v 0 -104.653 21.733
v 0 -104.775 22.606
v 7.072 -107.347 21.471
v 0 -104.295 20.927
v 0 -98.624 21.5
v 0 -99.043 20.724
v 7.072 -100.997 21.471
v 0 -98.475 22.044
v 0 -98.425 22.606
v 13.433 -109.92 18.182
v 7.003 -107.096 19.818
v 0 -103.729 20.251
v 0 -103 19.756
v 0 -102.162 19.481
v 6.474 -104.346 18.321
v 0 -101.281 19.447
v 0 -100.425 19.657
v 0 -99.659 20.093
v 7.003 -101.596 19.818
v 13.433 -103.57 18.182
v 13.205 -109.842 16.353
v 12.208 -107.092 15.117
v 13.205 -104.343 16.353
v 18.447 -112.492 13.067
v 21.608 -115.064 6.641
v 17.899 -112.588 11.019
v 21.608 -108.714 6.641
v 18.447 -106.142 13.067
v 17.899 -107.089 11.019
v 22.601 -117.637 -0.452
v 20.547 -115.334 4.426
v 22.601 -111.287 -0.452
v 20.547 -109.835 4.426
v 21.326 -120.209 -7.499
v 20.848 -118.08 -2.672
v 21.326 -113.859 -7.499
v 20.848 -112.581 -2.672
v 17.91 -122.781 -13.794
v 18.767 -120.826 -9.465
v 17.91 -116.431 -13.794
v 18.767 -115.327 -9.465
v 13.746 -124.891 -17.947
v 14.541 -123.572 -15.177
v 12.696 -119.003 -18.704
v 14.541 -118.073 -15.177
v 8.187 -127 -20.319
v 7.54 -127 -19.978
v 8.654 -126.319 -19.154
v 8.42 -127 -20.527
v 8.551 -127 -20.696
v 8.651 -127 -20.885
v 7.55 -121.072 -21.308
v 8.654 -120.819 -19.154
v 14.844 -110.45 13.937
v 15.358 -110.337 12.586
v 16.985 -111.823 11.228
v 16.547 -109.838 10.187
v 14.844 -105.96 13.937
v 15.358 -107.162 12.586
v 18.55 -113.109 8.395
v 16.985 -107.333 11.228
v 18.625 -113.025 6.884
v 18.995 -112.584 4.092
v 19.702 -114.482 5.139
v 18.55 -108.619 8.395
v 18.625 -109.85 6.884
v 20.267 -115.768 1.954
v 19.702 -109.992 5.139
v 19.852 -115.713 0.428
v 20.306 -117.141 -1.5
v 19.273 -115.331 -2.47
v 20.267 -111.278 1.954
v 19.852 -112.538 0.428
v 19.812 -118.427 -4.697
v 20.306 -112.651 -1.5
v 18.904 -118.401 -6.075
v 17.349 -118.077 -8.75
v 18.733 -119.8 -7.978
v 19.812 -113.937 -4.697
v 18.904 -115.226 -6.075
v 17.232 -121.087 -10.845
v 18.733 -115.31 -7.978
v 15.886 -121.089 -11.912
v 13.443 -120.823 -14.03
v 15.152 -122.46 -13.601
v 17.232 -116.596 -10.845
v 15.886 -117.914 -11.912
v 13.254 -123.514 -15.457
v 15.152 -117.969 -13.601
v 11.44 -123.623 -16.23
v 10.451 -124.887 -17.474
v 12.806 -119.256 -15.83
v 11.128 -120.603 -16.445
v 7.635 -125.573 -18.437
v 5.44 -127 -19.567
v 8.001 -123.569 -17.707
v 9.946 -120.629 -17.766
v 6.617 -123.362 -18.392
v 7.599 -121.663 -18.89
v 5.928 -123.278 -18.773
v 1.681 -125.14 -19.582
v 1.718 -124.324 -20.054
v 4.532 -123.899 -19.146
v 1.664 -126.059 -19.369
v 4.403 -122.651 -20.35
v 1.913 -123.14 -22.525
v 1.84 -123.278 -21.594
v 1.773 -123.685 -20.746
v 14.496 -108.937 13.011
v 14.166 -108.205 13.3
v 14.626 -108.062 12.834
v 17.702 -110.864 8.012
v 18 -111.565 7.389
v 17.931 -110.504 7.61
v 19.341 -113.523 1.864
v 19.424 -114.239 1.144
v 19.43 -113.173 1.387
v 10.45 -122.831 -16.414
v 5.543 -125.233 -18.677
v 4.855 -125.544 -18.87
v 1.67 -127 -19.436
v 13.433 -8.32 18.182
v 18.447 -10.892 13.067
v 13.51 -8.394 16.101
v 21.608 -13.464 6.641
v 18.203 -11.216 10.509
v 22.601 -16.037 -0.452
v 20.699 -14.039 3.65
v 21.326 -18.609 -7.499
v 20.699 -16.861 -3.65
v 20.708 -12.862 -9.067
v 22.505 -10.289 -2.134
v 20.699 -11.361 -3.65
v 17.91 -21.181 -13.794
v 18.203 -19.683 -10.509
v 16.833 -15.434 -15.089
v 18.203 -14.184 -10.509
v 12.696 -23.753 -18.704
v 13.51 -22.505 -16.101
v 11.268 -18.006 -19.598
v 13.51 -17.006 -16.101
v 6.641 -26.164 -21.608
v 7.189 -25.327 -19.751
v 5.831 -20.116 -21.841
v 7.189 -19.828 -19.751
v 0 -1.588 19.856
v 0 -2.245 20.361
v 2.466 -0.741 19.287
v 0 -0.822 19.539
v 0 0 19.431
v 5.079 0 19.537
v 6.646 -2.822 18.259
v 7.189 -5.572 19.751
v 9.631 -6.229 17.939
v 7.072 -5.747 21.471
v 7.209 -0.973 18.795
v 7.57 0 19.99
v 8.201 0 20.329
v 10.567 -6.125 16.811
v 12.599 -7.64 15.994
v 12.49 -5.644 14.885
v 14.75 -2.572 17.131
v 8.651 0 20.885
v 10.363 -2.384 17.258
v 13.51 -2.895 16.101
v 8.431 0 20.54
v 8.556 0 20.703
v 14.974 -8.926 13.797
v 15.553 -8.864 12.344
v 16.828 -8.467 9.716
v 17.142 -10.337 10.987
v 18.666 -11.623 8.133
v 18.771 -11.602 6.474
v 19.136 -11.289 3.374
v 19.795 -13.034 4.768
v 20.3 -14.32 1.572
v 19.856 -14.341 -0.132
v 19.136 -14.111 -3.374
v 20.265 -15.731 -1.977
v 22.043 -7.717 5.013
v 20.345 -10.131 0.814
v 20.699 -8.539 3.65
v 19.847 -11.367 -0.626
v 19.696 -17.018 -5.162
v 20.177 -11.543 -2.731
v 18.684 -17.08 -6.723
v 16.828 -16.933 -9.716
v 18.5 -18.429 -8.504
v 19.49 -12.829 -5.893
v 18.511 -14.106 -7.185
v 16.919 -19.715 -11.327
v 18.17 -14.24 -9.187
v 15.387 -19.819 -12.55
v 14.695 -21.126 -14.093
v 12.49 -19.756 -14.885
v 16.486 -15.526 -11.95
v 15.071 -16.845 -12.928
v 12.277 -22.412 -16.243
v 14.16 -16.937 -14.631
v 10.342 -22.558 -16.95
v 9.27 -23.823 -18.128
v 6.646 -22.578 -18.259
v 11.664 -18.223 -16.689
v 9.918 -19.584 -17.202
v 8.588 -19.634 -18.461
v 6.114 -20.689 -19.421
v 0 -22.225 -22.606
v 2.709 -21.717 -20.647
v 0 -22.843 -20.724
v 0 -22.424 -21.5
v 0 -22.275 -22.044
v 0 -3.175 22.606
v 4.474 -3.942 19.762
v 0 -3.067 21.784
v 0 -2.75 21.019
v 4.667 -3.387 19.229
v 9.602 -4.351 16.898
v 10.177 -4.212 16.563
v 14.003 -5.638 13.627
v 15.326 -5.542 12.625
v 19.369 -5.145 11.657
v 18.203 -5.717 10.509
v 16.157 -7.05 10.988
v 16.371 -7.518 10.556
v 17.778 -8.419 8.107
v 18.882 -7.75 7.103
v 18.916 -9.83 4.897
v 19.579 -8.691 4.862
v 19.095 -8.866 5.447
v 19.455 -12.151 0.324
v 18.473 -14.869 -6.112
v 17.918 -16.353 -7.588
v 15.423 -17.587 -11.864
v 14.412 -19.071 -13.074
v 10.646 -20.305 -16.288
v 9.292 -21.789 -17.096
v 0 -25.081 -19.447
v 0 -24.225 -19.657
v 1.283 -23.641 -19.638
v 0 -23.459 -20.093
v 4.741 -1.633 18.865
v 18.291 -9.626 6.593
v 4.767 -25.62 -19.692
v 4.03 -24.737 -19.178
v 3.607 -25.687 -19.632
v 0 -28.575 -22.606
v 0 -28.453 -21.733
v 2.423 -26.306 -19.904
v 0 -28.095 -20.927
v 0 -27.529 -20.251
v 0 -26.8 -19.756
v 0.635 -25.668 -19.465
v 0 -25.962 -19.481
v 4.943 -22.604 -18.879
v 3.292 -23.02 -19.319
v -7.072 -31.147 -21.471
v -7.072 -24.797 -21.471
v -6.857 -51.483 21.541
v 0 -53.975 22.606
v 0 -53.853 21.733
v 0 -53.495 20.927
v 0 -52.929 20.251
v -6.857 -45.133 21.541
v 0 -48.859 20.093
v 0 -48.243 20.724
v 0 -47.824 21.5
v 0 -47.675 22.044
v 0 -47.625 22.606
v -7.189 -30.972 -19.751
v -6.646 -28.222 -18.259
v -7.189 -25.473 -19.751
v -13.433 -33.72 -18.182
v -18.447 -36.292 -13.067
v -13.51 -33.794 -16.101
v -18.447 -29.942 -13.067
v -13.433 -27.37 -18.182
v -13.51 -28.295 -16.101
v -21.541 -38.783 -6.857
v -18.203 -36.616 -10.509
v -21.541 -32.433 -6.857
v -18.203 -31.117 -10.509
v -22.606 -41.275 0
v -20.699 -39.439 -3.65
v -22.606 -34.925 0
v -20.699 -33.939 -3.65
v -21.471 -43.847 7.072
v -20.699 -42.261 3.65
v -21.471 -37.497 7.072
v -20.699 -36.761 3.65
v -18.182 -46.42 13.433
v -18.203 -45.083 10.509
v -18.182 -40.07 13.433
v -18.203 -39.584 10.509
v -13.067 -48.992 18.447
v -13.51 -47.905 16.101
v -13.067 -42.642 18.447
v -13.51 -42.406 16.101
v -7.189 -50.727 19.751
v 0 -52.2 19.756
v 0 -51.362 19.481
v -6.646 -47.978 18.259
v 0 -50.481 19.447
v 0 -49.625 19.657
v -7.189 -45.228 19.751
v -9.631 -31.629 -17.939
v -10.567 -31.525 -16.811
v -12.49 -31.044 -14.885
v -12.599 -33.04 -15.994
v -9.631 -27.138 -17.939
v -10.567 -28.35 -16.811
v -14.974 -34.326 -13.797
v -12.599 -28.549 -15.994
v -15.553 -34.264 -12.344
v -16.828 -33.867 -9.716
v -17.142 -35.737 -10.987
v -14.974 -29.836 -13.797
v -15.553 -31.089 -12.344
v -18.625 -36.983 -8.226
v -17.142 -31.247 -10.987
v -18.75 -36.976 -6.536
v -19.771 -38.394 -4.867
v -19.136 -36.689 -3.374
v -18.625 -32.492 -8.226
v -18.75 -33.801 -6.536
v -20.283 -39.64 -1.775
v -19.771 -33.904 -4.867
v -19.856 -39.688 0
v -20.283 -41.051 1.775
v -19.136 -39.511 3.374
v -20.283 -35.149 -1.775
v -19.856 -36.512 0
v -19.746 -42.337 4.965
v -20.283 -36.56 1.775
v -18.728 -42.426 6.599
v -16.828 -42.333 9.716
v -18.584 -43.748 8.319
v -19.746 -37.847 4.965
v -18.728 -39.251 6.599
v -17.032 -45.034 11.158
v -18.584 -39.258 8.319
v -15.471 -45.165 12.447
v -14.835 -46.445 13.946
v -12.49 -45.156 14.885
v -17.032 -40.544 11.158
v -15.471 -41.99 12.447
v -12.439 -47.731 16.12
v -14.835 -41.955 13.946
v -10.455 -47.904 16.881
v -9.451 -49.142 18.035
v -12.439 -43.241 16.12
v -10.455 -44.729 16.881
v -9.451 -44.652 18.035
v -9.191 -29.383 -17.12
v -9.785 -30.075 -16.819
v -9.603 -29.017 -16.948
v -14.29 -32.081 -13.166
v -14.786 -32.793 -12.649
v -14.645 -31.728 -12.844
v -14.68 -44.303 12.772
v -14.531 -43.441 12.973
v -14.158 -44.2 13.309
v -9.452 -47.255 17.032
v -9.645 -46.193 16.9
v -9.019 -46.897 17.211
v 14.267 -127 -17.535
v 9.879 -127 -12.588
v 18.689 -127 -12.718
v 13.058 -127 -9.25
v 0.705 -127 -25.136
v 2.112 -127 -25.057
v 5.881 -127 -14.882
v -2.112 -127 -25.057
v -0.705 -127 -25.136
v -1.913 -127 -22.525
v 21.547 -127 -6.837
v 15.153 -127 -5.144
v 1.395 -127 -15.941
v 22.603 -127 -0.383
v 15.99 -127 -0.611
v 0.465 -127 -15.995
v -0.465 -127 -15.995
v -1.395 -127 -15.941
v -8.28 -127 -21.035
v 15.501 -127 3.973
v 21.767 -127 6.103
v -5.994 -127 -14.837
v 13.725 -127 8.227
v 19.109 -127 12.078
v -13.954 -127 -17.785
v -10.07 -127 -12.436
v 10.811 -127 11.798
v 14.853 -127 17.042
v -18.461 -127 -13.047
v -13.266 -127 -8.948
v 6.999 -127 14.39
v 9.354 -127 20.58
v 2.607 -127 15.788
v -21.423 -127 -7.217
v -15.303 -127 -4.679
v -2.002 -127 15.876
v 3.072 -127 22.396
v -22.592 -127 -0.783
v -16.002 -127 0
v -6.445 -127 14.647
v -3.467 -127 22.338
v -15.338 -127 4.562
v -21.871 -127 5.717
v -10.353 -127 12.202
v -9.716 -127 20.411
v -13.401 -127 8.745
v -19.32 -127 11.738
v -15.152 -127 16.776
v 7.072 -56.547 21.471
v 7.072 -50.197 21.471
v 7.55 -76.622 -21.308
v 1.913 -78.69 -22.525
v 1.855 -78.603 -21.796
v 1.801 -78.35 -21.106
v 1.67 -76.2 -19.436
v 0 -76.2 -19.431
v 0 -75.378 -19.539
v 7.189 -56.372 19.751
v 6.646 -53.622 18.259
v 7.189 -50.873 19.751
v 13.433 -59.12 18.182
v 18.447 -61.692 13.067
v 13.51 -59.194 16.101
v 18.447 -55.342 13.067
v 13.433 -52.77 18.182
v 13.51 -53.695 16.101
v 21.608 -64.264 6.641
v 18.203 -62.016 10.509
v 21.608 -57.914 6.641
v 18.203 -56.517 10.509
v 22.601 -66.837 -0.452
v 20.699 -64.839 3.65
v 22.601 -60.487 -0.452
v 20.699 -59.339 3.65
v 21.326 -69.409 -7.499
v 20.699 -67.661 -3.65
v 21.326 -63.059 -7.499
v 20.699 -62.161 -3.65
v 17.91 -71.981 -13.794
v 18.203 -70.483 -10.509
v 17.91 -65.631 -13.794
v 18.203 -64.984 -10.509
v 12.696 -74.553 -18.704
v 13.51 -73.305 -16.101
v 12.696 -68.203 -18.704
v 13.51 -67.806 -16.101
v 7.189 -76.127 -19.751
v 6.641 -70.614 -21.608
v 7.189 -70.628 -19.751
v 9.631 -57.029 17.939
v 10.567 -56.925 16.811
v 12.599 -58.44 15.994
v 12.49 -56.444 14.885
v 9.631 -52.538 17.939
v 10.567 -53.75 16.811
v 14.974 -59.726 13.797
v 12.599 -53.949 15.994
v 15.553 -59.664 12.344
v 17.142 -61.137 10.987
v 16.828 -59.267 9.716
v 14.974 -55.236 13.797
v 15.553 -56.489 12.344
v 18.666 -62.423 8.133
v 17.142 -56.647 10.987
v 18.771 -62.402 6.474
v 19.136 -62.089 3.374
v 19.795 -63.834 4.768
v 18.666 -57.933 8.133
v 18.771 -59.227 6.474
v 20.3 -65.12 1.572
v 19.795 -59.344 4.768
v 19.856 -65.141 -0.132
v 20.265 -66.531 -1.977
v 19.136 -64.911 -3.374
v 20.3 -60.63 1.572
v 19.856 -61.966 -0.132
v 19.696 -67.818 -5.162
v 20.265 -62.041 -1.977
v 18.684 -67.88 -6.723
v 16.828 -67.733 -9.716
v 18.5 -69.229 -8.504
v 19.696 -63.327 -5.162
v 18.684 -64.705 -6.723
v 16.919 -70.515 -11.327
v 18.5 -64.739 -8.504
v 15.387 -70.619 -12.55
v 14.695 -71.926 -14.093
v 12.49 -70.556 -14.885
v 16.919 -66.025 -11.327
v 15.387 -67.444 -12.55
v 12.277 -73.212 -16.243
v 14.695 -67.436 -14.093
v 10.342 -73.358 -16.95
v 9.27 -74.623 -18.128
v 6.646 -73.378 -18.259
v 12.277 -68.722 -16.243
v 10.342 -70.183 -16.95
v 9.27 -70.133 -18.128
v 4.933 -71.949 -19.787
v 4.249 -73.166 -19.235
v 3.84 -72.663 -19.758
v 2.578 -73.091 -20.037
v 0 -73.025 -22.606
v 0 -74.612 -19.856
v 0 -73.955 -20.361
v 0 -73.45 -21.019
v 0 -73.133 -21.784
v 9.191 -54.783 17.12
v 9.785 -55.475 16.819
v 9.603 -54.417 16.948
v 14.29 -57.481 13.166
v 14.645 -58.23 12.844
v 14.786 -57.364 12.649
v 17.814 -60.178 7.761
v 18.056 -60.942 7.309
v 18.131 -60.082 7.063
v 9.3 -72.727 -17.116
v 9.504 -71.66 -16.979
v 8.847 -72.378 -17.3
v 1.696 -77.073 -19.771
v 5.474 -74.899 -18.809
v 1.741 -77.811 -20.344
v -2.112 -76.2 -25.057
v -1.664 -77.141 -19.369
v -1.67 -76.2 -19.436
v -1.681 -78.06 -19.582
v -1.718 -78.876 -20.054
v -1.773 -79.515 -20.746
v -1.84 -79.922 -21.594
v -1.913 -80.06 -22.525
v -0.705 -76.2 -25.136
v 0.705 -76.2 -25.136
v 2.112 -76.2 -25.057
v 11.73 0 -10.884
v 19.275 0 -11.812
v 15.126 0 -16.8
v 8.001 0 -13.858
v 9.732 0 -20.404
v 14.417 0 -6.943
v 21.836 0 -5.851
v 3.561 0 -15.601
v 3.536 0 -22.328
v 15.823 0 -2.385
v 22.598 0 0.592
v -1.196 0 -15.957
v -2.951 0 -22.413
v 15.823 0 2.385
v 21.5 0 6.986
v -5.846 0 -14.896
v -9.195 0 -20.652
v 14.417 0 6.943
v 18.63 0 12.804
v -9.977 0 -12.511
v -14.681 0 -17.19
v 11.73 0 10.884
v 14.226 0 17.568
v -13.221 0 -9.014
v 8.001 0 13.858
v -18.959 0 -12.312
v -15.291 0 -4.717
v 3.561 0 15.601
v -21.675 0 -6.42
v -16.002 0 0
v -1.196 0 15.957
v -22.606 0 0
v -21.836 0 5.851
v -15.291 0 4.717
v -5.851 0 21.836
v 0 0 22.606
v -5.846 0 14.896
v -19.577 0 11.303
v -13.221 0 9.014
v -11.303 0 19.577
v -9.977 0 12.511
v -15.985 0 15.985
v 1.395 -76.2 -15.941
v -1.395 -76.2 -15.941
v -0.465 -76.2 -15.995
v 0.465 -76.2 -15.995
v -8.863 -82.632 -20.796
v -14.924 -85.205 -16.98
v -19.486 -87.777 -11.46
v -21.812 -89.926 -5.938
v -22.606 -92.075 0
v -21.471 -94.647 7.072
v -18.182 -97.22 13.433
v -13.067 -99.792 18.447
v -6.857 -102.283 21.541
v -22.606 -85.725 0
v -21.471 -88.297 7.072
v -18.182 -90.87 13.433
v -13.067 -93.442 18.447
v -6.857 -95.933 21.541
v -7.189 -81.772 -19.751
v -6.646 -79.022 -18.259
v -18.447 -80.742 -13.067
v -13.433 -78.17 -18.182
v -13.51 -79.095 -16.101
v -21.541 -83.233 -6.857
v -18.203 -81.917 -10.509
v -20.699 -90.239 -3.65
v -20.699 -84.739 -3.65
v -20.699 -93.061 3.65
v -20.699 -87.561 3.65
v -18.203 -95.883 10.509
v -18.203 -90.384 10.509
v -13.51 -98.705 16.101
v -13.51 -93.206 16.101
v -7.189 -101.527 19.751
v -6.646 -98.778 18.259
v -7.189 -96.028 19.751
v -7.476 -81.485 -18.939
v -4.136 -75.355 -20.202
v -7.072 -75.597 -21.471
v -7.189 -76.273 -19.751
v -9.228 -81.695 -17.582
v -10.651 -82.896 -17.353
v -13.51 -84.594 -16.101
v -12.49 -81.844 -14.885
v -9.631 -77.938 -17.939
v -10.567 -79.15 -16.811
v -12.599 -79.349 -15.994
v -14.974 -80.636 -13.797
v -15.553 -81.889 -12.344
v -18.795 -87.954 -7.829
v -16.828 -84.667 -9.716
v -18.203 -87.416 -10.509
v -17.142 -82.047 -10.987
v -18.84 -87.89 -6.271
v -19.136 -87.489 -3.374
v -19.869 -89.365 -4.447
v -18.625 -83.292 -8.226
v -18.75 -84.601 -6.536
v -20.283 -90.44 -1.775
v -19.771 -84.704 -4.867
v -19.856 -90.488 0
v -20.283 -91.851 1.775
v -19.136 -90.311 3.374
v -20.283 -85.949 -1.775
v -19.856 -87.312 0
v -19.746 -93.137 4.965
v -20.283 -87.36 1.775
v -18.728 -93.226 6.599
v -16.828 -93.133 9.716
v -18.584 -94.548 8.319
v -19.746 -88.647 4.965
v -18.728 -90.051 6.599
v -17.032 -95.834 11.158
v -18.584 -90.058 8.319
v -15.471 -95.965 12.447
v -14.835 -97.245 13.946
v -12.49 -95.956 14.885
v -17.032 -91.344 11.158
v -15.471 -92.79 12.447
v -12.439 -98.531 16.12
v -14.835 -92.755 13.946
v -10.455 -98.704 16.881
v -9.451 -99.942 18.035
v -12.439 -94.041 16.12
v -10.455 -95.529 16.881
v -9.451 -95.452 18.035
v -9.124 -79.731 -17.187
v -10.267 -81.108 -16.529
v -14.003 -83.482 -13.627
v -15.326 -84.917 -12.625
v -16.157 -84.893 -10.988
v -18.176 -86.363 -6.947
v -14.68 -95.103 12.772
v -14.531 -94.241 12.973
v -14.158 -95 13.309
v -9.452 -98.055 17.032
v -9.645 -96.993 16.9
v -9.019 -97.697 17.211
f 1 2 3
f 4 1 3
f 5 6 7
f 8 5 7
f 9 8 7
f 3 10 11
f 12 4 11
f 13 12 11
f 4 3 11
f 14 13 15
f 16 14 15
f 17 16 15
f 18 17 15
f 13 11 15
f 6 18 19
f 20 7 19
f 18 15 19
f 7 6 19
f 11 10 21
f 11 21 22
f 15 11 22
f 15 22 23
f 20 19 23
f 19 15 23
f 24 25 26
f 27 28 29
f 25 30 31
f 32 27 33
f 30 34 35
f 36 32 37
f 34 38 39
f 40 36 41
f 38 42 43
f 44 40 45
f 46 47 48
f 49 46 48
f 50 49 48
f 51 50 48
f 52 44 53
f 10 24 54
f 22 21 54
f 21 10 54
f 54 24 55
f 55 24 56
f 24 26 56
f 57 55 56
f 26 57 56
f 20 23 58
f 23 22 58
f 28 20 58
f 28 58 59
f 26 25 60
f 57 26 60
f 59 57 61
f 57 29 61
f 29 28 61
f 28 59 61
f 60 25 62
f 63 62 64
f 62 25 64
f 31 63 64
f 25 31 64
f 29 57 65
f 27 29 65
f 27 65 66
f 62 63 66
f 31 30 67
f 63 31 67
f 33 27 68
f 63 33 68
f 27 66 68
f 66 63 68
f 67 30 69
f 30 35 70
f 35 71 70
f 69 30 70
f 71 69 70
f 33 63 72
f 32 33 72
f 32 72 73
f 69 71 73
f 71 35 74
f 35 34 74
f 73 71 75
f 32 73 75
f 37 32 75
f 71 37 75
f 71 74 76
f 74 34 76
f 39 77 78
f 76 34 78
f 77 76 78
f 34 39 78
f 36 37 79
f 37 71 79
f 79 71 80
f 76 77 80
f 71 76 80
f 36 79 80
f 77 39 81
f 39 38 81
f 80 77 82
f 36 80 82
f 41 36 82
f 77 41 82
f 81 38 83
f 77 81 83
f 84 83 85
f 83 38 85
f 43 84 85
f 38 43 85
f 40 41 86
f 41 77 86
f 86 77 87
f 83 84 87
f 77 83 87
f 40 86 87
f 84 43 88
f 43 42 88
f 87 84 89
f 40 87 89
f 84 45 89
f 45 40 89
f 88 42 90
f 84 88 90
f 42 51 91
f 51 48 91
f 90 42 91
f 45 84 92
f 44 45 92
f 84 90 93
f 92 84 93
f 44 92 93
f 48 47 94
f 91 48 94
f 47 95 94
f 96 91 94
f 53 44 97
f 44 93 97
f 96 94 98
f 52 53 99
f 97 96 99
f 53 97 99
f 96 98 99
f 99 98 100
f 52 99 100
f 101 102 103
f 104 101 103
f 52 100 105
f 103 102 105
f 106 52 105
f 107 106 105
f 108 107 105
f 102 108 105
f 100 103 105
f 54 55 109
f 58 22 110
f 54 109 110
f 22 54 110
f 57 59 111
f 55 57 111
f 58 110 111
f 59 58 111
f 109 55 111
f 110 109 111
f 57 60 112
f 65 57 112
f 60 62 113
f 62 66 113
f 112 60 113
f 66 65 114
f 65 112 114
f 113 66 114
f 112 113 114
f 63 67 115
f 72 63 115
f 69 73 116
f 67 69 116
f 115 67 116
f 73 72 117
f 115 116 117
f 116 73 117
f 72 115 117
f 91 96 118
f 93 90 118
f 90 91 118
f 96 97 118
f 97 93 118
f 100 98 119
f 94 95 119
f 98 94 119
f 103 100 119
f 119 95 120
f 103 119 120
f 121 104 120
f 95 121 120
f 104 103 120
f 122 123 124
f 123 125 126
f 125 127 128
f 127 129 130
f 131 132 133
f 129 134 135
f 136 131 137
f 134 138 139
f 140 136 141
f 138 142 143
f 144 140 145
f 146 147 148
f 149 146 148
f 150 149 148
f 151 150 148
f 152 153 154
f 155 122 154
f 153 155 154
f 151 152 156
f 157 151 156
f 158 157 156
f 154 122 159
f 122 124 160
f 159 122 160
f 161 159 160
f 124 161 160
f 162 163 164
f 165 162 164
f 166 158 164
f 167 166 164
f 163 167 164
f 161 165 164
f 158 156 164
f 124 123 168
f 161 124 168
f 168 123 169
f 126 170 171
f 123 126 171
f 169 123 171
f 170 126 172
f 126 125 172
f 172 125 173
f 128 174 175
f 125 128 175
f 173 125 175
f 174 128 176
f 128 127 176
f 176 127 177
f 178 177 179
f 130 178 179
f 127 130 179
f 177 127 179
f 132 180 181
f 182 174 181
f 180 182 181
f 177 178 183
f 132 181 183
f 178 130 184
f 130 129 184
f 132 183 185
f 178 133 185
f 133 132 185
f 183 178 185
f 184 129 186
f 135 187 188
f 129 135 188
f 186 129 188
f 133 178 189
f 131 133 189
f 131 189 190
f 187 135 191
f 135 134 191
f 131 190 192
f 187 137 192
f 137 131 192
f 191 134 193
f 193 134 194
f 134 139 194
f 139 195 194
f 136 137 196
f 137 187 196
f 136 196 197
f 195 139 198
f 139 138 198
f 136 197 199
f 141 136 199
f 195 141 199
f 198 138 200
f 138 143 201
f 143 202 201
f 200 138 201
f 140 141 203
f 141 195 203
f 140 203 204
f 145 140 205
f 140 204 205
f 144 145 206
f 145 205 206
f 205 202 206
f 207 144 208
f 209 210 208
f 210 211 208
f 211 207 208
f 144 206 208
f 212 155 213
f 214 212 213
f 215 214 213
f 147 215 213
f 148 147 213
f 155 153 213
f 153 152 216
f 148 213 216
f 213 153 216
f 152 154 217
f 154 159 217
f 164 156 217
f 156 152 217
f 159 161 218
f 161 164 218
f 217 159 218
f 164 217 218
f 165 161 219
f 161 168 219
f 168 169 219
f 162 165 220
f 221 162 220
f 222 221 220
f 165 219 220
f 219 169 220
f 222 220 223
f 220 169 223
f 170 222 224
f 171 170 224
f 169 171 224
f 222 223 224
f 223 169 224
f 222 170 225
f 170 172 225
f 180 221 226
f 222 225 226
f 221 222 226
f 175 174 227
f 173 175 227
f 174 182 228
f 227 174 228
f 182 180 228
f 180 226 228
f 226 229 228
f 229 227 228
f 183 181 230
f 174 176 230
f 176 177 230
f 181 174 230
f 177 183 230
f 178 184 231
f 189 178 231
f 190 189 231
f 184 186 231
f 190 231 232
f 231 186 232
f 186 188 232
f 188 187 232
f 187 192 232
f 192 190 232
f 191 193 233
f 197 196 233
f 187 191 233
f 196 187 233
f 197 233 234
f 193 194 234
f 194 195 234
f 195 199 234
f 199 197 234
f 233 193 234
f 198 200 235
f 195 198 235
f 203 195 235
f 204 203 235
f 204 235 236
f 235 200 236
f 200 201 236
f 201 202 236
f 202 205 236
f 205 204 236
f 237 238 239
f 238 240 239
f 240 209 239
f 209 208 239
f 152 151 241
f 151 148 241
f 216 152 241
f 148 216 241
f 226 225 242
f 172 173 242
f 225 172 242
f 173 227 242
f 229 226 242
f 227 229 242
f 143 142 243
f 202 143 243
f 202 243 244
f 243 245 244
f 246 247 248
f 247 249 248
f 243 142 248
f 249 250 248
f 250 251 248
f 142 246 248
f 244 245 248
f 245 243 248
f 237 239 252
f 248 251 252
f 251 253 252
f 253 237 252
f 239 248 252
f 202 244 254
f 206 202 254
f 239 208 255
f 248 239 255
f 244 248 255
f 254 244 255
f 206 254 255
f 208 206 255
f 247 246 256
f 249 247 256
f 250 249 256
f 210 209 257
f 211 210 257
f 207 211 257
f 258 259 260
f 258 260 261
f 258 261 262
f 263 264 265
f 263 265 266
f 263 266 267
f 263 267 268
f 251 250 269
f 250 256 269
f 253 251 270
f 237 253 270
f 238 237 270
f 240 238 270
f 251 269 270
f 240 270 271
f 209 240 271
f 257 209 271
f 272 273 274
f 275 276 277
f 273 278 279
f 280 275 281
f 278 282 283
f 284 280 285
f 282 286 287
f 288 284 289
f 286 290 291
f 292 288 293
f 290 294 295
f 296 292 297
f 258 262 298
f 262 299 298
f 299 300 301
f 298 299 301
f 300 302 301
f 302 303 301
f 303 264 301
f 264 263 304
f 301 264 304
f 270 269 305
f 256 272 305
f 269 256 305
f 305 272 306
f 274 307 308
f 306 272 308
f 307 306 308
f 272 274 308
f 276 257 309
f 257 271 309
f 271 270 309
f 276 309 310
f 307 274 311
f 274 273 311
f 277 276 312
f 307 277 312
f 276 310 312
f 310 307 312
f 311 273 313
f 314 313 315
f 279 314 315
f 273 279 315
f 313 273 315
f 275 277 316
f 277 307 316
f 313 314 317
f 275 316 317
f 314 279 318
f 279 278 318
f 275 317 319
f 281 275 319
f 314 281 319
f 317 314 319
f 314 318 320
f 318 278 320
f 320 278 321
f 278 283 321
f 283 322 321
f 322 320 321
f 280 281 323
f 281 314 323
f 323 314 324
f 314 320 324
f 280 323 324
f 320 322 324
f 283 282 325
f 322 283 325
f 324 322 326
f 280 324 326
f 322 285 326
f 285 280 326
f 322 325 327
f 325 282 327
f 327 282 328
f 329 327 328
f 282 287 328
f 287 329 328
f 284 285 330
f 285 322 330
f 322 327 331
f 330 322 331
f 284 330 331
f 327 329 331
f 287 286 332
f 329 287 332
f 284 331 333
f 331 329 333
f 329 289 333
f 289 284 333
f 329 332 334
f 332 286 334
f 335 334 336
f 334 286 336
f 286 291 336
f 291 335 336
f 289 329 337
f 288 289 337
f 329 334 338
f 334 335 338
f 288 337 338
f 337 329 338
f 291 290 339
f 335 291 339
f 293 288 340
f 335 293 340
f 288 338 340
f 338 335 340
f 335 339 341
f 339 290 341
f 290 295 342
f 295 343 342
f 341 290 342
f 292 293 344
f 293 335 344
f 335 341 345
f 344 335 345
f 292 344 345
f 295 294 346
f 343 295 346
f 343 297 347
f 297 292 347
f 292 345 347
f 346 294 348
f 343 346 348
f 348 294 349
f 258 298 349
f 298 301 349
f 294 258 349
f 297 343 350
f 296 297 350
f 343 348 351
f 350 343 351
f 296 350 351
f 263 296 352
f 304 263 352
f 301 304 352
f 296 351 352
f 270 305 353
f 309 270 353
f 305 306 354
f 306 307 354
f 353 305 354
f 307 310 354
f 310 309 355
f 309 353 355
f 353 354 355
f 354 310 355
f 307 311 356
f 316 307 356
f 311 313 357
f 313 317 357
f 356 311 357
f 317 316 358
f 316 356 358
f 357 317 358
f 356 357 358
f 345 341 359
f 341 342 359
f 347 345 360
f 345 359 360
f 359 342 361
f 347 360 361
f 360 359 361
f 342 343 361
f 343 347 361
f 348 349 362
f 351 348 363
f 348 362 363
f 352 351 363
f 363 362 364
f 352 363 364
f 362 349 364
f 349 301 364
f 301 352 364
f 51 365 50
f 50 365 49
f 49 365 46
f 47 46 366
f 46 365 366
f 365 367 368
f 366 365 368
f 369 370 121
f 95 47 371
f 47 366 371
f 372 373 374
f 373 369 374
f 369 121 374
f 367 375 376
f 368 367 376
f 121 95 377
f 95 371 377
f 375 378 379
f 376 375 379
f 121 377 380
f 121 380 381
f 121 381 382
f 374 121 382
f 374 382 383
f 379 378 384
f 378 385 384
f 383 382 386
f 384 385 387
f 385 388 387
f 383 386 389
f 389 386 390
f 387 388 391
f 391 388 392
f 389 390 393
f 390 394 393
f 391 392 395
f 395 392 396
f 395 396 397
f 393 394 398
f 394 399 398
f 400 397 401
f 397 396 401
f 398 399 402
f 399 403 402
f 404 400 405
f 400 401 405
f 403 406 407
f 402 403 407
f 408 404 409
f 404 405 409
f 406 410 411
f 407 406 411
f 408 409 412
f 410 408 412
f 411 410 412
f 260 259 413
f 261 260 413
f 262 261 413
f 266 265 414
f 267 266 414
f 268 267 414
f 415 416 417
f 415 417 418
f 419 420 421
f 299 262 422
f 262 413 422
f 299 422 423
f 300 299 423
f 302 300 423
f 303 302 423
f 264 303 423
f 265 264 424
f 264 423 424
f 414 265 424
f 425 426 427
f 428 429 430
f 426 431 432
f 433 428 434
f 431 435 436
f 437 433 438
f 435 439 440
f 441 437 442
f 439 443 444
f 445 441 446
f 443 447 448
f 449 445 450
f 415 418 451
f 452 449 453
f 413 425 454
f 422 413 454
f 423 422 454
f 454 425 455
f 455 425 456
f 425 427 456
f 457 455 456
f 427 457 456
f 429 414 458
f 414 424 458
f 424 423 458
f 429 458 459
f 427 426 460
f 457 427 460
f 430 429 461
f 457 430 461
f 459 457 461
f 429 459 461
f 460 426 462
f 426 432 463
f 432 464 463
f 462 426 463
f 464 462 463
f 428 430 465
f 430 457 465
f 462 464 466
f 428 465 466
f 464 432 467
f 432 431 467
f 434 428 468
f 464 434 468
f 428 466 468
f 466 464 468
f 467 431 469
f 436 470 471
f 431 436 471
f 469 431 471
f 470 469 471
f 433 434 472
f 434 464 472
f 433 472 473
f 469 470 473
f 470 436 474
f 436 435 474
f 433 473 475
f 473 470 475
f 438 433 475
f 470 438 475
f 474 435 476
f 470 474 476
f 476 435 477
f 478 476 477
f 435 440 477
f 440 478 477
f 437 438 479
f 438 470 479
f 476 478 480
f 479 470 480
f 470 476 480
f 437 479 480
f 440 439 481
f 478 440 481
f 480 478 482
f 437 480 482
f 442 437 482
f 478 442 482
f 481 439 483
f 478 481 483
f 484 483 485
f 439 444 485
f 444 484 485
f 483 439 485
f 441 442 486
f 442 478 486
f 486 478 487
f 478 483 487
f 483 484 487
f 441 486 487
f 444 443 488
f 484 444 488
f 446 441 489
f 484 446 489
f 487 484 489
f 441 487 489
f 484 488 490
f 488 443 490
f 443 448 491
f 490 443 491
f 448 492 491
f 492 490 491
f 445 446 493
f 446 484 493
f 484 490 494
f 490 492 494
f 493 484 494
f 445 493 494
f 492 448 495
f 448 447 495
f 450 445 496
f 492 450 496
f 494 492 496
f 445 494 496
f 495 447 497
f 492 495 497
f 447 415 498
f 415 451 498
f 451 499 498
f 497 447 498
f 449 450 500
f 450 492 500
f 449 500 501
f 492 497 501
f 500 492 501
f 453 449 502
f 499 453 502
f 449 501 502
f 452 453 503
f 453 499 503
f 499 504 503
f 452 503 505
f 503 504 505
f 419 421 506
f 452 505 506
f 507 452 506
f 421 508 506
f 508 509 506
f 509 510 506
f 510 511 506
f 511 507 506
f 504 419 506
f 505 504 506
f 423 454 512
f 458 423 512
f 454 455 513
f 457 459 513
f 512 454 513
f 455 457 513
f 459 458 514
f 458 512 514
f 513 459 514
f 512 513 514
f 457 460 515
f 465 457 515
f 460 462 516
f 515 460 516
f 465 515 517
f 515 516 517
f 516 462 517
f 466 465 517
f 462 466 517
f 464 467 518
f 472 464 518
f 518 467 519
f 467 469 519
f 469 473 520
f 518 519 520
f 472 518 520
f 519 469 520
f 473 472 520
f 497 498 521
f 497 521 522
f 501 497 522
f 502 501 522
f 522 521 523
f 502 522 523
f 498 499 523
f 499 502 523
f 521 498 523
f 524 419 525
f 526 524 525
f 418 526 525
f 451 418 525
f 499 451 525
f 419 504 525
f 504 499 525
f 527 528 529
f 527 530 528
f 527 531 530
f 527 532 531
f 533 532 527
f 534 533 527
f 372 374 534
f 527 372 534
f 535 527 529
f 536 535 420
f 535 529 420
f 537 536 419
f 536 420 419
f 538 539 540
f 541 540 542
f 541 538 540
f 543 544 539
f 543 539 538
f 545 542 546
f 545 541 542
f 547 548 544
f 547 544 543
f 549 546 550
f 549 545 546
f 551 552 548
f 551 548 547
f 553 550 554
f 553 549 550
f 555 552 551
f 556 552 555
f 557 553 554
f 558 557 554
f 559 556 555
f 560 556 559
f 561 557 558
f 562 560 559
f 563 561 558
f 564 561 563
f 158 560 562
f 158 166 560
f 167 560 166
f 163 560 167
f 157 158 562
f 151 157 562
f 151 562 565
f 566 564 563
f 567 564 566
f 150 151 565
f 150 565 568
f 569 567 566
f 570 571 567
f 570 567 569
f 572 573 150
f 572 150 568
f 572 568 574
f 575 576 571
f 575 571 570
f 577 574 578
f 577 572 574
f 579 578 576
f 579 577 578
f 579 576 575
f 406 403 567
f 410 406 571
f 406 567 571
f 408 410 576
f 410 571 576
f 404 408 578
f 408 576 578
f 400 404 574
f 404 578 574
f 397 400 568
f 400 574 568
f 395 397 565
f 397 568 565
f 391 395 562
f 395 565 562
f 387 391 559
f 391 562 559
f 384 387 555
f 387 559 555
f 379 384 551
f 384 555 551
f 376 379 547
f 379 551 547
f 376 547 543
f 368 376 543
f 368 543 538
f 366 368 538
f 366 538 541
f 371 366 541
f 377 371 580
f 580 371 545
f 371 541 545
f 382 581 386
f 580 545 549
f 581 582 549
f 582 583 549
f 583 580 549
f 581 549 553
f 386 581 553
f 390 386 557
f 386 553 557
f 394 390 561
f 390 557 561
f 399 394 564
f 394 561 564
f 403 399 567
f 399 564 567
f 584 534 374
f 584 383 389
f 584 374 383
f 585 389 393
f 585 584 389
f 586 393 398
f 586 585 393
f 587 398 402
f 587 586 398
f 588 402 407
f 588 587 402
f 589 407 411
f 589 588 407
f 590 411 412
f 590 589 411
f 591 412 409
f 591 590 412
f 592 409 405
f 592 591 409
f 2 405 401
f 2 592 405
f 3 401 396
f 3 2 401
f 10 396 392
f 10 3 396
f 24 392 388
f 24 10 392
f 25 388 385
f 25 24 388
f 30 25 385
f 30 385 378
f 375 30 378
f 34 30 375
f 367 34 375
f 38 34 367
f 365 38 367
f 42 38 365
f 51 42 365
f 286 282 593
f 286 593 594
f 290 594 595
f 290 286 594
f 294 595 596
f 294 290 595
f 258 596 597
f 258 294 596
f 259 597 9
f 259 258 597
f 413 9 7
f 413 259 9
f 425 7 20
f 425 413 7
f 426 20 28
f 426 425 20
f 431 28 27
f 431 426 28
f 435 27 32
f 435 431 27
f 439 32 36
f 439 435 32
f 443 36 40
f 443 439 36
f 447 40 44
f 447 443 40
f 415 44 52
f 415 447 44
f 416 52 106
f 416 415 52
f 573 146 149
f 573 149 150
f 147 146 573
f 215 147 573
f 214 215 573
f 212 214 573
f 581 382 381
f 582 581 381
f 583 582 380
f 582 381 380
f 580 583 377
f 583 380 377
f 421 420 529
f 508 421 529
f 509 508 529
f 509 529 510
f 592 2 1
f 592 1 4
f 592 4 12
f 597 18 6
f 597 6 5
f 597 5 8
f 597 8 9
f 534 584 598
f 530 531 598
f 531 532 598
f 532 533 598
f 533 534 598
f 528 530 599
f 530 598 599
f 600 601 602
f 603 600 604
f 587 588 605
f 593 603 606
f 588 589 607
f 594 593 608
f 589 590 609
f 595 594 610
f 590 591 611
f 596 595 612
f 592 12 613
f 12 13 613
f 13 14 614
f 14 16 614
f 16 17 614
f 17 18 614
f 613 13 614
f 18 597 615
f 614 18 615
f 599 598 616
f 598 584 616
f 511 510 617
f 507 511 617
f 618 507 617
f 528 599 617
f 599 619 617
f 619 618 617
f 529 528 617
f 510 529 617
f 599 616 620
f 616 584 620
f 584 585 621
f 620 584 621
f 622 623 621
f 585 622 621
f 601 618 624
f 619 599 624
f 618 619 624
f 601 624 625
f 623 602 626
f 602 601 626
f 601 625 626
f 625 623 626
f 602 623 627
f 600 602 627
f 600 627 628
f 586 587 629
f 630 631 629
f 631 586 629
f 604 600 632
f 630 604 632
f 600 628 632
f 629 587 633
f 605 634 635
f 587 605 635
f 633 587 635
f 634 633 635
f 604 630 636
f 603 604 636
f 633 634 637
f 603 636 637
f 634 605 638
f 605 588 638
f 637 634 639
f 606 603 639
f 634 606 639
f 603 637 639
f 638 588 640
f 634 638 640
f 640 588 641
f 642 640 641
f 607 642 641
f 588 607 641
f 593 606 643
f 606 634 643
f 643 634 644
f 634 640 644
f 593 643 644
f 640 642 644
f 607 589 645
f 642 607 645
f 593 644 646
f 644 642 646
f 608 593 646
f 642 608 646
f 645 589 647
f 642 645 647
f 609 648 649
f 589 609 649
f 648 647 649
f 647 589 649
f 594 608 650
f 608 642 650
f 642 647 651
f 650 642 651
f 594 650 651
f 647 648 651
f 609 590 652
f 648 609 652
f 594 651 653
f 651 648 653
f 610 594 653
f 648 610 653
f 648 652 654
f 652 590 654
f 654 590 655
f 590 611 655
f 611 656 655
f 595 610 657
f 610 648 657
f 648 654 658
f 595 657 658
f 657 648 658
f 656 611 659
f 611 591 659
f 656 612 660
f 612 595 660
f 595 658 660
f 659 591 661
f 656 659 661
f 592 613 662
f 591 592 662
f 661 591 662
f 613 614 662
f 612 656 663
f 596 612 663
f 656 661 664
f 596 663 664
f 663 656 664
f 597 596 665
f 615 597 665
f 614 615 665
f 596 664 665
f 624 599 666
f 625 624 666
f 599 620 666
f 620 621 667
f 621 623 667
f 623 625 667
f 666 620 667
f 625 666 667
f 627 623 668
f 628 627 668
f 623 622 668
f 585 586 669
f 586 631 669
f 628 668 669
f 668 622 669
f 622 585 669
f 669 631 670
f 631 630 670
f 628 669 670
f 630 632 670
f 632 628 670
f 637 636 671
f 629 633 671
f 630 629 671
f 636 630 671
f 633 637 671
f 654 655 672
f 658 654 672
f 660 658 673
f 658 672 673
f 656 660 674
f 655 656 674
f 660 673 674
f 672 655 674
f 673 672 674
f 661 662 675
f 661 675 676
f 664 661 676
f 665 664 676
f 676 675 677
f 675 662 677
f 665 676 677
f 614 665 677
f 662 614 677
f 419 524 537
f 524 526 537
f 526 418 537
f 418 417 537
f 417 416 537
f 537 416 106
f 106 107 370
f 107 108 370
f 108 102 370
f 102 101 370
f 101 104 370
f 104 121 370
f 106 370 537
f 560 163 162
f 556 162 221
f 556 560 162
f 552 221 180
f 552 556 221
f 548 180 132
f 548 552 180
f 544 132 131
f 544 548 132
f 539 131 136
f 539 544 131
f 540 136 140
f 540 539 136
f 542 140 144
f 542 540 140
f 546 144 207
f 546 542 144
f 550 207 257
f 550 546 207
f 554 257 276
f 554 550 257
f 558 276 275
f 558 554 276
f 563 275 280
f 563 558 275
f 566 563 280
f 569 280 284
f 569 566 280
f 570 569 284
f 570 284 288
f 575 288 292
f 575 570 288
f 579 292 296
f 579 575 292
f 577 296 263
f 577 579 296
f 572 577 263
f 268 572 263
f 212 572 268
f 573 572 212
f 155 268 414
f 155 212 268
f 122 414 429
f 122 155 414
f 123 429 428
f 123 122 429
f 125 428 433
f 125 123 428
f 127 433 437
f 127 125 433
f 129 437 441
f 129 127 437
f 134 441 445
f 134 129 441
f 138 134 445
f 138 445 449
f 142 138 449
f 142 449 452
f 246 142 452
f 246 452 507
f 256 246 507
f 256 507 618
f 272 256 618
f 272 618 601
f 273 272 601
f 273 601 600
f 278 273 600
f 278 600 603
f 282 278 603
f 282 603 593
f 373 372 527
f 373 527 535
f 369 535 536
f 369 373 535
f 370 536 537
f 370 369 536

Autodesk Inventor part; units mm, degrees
ref_plane "YZ Plane" through (0, 0, 0) normal (1, 0, 0) x (0, 1, 0)
ref_plane "XZ Plane" through (0, 0, 0) normal (0, 1, 0) x (-1, 0, 0)
ref_plane "XY Plane" through (0, 0, 0) normal (0, 0, 1) x (1, 0, 0)
sketch "Sketch1" plane through (0, 0, 0) normal (0, 1, 0) x (-1, 0, 0)
  circle A0 centre (0, 0) radius 22.606
  circle A1 centre (0, 0) radius 16.002
  dimension "d4" = 32.004
  dimension "d5" = 45.212
extrude "Extrusion1" add sketch "Sketch1" against normal blind 127
sketch "Sketch2" plane through (0, 0, 0) normal (1, 0, 0) x (0, 1, 0)
  line L0 (0, 22.606) -> (-127, 22.606) projected
  circle A0 centre (0, 22.606) radius 3.175
  line L1 (0, 22.606) -> (0, -22.606) construction
  point P0 (0, 0)
  dimension "d18" = 6.35
  dimension "d23" = 0
coil "Coil1" sketch "Sketch2" operation cut axis through (0, -10, 0) along (0, -1, 0) pitch 50.8 turns 2.5 hand left
sketch "Sketch13" plane through (0, -127, 0) normal (0, -1, 0) x (1, 0, 0)
  circle A0 centre (0, 0) radius 25.146 construction
  arc A1 (8.6509, -20.8852) -> (0, -22.606) centre (0, 0) ccw construction
  line L0 (-1.3947, -15.9411) -> (-2.1121, -25.0571)
  line L1 (1.3947, -15.9411) -> (2.1121, -25.0571)
  line L2 (0, 0) -> (0, -25.146) construction
  circle A2 centre (0, 0) radius 16.002 construction
  arc A3 (-1.3947, -15.9411) -> (1.3947, -15.9411) centre (0, 0) ccw
  arc A4 (-2.1121, -25.0571) -> (2.1121, -25.0571) centre (0, 0) ccw
  dimension "d48" = 2.54
  dimension "d49" = 4.5
  dimension "d50" = 4.5
extrude "Extrusion6" add sketch "Sketch13" against normal blind 50.8
sketch "Sketch10" plane through (0, -127, 0) normal (0, -1, 0) x (1, 0, 0)
  line L0 (0, 0) -> (0, -22.606) construction
  arc A0 (8.6509, -20.8852) -> (0, -22.606) centre (0, 0) ccw construction
  arc A1 (0, -15.875) -> (3.175, -15.5543) centre (0, 0) ccw
  line L1 (3.175, -15.5543) -> (3.175, -25.781)
  line L2 (3.175, -25.781) -> (0, -25.781)
  arc A2 (-3.175, -15.5543) -> (0, -15.875) centre (0, 0) ccw
  line L3 (-3.175, -15.5543) -> (-3.175, -25.781)
  line L4 (-3.175, -25.781) -> (0, -25.781)
  dimension "d37" = 3.175
  dimension "d38" = 31.75
  dimension "d40" = 3.175
equation "\"d49\" = 0.5 * angleForSlot"
equation "\"d50\" = 0.5 * angleForSlot"
equation "\"angleForSlot\" = 9deg"
properties part number "InnerThreadedFocusTube" material "PBT Plastic"
